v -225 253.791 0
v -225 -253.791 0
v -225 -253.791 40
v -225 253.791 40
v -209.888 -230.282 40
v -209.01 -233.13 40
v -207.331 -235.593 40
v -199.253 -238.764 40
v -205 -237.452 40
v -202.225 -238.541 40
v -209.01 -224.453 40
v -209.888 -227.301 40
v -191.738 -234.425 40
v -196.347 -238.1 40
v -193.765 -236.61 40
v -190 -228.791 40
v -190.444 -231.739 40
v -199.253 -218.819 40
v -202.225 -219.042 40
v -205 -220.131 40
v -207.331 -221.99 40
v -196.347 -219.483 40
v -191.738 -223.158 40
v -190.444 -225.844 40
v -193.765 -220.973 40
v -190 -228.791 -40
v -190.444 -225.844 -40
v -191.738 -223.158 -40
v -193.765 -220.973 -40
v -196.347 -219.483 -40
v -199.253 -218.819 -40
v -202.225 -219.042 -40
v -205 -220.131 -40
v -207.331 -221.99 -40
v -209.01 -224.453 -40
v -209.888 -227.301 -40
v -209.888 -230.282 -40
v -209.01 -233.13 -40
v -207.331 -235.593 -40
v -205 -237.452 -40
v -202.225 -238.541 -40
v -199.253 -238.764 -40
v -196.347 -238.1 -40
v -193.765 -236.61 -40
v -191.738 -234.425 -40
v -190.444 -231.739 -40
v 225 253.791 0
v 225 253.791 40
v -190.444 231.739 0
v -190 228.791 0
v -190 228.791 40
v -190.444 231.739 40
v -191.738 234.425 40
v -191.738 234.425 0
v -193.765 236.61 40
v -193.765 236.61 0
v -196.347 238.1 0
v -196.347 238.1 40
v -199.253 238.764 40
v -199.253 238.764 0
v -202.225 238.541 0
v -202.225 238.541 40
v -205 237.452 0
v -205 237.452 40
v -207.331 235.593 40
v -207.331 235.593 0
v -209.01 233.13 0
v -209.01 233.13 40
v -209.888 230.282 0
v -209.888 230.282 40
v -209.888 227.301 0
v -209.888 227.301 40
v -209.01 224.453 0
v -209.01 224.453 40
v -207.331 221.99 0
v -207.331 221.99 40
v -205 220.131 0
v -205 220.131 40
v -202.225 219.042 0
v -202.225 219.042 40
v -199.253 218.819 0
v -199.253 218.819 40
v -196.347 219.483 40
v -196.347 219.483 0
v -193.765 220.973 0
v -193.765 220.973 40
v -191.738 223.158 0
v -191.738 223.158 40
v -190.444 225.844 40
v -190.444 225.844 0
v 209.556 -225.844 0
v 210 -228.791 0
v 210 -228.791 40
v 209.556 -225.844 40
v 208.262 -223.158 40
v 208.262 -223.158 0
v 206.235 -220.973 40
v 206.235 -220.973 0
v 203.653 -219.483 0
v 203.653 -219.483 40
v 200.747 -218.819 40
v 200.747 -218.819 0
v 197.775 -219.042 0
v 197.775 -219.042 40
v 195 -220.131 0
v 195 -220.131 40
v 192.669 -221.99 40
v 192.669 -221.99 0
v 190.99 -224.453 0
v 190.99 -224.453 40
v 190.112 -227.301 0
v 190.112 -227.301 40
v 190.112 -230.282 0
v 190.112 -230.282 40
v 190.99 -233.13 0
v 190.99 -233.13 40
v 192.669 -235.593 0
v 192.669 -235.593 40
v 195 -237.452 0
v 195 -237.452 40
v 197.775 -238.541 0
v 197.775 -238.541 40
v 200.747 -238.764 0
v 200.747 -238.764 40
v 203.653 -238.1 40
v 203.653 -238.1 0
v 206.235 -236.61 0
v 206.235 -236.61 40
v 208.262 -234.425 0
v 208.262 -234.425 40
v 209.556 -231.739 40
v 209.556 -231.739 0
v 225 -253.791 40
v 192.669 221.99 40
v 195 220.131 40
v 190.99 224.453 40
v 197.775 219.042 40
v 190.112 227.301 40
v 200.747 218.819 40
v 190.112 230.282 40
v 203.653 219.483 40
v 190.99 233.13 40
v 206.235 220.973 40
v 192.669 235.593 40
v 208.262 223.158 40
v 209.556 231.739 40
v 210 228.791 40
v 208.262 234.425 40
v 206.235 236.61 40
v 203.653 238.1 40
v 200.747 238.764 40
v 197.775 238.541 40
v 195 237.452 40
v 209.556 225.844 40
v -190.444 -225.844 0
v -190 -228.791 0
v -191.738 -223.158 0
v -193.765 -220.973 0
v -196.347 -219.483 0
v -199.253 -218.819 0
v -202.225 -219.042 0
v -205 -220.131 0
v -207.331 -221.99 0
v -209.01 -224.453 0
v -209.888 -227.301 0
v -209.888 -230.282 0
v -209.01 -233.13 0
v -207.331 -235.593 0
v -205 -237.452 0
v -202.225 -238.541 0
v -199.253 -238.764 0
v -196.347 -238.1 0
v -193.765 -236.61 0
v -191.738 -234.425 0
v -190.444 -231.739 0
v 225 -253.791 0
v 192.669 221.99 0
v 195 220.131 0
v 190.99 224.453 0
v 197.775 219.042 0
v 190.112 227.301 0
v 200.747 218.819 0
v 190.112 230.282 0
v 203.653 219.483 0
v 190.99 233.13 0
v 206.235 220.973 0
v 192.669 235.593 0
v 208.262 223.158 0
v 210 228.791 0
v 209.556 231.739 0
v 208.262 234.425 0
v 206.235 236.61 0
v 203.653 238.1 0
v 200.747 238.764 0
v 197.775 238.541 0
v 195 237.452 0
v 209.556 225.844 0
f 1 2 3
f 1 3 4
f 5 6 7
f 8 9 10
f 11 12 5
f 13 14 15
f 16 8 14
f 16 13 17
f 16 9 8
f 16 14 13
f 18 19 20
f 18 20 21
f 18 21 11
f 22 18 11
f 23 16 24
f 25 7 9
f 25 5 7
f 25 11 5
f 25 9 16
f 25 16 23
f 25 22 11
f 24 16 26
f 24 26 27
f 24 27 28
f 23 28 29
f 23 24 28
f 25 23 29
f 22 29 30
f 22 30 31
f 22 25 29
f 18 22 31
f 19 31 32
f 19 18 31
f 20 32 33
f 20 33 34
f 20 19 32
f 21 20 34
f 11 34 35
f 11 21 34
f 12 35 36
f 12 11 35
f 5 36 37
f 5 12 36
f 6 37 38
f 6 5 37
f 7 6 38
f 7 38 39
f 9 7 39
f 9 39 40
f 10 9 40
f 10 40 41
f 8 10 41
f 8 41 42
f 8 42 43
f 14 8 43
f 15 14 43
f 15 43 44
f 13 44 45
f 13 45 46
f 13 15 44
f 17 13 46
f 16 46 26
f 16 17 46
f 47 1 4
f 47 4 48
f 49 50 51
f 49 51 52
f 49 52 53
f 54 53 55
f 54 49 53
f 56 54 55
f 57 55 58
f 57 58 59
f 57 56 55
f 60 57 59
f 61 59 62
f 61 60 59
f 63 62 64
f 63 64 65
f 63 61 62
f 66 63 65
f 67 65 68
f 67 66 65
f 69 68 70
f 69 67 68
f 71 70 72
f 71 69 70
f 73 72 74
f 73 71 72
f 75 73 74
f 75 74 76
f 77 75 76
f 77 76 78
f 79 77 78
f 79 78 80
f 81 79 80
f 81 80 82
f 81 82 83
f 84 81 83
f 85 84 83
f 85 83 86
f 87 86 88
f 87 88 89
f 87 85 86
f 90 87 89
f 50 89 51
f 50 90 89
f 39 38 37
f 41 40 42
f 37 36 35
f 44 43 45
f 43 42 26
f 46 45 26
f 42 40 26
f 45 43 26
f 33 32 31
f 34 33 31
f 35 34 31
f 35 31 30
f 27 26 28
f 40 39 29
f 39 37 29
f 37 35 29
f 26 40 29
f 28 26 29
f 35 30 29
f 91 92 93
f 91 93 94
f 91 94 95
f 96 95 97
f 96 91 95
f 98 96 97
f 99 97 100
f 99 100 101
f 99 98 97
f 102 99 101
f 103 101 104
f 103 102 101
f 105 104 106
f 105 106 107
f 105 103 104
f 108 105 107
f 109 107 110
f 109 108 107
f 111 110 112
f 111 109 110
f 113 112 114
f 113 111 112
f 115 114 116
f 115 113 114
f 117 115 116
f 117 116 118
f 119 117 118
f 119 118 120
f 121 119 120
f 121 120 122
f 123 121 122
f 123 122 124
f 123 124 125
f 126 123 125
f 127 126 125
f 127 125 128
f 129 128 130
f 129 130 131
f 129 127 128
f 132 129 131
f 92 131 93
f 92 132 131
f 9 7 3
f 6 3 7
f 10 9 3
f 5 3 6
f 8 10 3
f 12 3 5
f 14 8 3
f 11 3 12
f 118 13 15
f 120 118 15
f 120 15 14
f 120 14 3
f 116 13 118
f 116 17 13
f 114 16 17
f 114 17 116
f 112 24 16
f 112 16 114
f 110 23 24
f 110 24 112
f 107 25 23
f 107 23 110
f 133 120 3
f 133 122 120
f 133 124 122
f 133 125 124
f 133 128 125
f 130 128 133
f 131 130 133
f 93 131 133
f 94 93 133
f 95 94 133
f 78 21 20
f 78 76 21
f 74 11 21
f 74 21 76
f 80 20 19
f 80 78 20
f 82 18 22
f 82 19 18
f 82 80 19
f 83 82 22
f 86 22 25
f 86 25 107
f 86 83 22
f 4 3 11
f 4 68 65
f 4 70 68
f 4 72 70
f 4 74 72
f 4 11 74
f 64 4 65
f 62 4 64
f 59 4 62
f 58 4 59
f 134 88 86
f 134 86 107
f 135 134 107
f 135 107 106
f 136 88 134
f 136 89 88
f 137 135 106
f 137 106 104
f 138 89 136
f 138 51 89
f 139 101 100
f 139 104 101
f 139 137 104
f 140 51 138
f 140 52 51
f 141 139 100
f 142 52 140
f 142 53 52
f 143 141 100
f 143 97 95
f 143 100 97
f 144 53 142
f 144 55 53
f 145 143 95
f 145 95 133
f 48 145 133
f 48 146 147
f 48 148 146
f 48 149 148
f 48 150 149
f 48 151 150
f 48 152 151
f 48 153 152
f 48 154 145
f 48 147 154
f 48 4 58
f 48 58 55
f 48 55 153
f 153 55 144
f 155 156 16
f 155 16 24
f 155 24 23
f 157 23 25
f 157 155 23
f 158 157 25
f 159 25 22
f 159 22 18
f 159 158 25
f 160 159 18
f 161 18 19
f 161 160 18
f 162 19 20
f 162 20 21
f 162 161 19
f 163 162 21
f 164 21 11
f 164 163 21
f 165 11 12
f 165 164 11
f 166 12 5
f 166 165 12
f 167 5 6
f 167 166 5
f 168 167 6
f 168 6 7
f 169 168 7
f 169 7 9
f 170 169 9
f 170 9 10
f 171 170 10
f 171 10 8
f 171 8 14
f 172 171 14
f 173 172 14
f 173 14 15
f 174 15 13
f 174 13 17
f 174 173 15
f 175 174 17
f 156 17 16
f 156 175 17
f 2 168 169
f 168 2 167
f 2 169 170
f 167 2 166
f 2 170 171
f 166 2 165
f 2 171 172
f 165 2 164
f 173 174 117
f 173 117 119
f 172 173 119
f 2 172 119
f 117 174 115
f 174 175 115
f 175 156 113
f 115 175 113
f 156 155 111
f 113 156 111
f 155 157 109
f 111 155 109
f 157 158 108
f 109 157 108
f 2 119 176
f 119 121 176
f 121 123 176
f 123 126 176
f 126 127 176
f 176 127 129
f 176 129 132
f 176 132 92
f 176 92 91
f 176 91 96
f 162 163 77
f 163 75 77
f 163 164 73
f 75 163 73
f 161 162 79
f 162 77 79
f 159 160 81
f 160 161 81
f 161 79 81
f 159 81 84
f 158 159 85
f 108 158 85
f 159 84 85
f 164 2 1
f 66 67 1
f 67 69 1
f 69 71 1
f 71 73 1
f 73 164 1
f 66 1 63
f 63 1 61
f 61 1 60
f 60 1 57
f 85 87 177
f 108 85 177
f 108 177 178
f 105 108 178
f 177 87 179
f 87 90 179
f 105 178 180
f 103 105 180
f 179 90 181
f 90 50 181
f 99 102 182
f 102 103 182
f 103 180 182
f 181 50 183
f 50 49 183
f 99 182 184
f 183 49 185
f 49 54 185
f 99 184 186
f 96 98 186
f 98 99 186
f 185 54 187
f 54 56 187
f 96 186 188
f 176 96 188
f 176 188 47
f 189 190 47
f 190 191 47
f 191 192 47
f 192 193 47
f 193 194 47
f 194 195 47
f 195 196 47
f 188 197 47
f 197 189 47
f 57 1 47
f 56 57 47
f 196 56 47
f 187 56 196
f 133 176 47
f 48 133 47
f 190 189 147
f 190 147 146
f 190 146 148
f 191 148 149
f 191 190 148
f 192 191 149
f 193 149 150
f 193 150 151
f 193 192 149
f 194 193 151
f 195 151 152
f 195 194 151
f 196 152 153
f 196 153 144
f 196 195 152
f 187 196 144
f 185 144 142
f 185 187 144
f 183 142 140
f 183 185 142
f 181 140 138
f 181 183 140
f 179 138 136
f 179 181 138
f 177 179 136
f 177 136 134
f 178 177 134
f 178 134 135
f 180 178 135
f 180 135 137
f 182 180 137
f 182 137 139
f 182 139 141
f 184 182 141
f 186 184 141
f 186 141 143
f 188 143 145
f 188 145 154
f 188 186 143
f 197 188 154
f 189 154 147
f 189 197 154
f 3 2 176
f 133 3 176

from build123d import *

# Parameters (mm, degrees)
F0_W     = 450
F0_H     = 507.5829336092
F0_R     = 10
F1_DEPTH = 40
F2_R     = 10
F3_DEPTH = 80


# Not quite as in the source:
# - the program builds the solid bodies; features that only make, move or delete a surface that nothing else refers to are left out


with BuildPart() as f1:
    # F0 (on Top) → F1 (new body)
    with BuildSketch(Plane.XY):
        Rectangle(F0_W, F0_H)
        with Locations((-200, -228.7914668046)):
            Circle(F0_R, mode=Mode.SUBTRACT)
        with Locations((200, -228.7914668046)):
            Circle(F0_R, mode=Mode.SUBTRACT)
        with Locations((-200, 228.7914668046)):
            Circle(F0_R, mode=Mode.SUBTRACT)
        with Locations((200, 228.7914668046)):
            Circle(F0_R, mode=Mode.SUBTRACT)
    extrude(amount=F1_DEPTH)


with BuildPart() as f3:
    # F2 (on face) → F3 (new body)
    with BuildSketch(Plane.XY.offset(40)):
        with Locations((-200, -228.7914668046)):
            Circle(F2_R)
    extrude(amount=-F3_DEPTH)


solid = Compound([f1.part, f3.part])
